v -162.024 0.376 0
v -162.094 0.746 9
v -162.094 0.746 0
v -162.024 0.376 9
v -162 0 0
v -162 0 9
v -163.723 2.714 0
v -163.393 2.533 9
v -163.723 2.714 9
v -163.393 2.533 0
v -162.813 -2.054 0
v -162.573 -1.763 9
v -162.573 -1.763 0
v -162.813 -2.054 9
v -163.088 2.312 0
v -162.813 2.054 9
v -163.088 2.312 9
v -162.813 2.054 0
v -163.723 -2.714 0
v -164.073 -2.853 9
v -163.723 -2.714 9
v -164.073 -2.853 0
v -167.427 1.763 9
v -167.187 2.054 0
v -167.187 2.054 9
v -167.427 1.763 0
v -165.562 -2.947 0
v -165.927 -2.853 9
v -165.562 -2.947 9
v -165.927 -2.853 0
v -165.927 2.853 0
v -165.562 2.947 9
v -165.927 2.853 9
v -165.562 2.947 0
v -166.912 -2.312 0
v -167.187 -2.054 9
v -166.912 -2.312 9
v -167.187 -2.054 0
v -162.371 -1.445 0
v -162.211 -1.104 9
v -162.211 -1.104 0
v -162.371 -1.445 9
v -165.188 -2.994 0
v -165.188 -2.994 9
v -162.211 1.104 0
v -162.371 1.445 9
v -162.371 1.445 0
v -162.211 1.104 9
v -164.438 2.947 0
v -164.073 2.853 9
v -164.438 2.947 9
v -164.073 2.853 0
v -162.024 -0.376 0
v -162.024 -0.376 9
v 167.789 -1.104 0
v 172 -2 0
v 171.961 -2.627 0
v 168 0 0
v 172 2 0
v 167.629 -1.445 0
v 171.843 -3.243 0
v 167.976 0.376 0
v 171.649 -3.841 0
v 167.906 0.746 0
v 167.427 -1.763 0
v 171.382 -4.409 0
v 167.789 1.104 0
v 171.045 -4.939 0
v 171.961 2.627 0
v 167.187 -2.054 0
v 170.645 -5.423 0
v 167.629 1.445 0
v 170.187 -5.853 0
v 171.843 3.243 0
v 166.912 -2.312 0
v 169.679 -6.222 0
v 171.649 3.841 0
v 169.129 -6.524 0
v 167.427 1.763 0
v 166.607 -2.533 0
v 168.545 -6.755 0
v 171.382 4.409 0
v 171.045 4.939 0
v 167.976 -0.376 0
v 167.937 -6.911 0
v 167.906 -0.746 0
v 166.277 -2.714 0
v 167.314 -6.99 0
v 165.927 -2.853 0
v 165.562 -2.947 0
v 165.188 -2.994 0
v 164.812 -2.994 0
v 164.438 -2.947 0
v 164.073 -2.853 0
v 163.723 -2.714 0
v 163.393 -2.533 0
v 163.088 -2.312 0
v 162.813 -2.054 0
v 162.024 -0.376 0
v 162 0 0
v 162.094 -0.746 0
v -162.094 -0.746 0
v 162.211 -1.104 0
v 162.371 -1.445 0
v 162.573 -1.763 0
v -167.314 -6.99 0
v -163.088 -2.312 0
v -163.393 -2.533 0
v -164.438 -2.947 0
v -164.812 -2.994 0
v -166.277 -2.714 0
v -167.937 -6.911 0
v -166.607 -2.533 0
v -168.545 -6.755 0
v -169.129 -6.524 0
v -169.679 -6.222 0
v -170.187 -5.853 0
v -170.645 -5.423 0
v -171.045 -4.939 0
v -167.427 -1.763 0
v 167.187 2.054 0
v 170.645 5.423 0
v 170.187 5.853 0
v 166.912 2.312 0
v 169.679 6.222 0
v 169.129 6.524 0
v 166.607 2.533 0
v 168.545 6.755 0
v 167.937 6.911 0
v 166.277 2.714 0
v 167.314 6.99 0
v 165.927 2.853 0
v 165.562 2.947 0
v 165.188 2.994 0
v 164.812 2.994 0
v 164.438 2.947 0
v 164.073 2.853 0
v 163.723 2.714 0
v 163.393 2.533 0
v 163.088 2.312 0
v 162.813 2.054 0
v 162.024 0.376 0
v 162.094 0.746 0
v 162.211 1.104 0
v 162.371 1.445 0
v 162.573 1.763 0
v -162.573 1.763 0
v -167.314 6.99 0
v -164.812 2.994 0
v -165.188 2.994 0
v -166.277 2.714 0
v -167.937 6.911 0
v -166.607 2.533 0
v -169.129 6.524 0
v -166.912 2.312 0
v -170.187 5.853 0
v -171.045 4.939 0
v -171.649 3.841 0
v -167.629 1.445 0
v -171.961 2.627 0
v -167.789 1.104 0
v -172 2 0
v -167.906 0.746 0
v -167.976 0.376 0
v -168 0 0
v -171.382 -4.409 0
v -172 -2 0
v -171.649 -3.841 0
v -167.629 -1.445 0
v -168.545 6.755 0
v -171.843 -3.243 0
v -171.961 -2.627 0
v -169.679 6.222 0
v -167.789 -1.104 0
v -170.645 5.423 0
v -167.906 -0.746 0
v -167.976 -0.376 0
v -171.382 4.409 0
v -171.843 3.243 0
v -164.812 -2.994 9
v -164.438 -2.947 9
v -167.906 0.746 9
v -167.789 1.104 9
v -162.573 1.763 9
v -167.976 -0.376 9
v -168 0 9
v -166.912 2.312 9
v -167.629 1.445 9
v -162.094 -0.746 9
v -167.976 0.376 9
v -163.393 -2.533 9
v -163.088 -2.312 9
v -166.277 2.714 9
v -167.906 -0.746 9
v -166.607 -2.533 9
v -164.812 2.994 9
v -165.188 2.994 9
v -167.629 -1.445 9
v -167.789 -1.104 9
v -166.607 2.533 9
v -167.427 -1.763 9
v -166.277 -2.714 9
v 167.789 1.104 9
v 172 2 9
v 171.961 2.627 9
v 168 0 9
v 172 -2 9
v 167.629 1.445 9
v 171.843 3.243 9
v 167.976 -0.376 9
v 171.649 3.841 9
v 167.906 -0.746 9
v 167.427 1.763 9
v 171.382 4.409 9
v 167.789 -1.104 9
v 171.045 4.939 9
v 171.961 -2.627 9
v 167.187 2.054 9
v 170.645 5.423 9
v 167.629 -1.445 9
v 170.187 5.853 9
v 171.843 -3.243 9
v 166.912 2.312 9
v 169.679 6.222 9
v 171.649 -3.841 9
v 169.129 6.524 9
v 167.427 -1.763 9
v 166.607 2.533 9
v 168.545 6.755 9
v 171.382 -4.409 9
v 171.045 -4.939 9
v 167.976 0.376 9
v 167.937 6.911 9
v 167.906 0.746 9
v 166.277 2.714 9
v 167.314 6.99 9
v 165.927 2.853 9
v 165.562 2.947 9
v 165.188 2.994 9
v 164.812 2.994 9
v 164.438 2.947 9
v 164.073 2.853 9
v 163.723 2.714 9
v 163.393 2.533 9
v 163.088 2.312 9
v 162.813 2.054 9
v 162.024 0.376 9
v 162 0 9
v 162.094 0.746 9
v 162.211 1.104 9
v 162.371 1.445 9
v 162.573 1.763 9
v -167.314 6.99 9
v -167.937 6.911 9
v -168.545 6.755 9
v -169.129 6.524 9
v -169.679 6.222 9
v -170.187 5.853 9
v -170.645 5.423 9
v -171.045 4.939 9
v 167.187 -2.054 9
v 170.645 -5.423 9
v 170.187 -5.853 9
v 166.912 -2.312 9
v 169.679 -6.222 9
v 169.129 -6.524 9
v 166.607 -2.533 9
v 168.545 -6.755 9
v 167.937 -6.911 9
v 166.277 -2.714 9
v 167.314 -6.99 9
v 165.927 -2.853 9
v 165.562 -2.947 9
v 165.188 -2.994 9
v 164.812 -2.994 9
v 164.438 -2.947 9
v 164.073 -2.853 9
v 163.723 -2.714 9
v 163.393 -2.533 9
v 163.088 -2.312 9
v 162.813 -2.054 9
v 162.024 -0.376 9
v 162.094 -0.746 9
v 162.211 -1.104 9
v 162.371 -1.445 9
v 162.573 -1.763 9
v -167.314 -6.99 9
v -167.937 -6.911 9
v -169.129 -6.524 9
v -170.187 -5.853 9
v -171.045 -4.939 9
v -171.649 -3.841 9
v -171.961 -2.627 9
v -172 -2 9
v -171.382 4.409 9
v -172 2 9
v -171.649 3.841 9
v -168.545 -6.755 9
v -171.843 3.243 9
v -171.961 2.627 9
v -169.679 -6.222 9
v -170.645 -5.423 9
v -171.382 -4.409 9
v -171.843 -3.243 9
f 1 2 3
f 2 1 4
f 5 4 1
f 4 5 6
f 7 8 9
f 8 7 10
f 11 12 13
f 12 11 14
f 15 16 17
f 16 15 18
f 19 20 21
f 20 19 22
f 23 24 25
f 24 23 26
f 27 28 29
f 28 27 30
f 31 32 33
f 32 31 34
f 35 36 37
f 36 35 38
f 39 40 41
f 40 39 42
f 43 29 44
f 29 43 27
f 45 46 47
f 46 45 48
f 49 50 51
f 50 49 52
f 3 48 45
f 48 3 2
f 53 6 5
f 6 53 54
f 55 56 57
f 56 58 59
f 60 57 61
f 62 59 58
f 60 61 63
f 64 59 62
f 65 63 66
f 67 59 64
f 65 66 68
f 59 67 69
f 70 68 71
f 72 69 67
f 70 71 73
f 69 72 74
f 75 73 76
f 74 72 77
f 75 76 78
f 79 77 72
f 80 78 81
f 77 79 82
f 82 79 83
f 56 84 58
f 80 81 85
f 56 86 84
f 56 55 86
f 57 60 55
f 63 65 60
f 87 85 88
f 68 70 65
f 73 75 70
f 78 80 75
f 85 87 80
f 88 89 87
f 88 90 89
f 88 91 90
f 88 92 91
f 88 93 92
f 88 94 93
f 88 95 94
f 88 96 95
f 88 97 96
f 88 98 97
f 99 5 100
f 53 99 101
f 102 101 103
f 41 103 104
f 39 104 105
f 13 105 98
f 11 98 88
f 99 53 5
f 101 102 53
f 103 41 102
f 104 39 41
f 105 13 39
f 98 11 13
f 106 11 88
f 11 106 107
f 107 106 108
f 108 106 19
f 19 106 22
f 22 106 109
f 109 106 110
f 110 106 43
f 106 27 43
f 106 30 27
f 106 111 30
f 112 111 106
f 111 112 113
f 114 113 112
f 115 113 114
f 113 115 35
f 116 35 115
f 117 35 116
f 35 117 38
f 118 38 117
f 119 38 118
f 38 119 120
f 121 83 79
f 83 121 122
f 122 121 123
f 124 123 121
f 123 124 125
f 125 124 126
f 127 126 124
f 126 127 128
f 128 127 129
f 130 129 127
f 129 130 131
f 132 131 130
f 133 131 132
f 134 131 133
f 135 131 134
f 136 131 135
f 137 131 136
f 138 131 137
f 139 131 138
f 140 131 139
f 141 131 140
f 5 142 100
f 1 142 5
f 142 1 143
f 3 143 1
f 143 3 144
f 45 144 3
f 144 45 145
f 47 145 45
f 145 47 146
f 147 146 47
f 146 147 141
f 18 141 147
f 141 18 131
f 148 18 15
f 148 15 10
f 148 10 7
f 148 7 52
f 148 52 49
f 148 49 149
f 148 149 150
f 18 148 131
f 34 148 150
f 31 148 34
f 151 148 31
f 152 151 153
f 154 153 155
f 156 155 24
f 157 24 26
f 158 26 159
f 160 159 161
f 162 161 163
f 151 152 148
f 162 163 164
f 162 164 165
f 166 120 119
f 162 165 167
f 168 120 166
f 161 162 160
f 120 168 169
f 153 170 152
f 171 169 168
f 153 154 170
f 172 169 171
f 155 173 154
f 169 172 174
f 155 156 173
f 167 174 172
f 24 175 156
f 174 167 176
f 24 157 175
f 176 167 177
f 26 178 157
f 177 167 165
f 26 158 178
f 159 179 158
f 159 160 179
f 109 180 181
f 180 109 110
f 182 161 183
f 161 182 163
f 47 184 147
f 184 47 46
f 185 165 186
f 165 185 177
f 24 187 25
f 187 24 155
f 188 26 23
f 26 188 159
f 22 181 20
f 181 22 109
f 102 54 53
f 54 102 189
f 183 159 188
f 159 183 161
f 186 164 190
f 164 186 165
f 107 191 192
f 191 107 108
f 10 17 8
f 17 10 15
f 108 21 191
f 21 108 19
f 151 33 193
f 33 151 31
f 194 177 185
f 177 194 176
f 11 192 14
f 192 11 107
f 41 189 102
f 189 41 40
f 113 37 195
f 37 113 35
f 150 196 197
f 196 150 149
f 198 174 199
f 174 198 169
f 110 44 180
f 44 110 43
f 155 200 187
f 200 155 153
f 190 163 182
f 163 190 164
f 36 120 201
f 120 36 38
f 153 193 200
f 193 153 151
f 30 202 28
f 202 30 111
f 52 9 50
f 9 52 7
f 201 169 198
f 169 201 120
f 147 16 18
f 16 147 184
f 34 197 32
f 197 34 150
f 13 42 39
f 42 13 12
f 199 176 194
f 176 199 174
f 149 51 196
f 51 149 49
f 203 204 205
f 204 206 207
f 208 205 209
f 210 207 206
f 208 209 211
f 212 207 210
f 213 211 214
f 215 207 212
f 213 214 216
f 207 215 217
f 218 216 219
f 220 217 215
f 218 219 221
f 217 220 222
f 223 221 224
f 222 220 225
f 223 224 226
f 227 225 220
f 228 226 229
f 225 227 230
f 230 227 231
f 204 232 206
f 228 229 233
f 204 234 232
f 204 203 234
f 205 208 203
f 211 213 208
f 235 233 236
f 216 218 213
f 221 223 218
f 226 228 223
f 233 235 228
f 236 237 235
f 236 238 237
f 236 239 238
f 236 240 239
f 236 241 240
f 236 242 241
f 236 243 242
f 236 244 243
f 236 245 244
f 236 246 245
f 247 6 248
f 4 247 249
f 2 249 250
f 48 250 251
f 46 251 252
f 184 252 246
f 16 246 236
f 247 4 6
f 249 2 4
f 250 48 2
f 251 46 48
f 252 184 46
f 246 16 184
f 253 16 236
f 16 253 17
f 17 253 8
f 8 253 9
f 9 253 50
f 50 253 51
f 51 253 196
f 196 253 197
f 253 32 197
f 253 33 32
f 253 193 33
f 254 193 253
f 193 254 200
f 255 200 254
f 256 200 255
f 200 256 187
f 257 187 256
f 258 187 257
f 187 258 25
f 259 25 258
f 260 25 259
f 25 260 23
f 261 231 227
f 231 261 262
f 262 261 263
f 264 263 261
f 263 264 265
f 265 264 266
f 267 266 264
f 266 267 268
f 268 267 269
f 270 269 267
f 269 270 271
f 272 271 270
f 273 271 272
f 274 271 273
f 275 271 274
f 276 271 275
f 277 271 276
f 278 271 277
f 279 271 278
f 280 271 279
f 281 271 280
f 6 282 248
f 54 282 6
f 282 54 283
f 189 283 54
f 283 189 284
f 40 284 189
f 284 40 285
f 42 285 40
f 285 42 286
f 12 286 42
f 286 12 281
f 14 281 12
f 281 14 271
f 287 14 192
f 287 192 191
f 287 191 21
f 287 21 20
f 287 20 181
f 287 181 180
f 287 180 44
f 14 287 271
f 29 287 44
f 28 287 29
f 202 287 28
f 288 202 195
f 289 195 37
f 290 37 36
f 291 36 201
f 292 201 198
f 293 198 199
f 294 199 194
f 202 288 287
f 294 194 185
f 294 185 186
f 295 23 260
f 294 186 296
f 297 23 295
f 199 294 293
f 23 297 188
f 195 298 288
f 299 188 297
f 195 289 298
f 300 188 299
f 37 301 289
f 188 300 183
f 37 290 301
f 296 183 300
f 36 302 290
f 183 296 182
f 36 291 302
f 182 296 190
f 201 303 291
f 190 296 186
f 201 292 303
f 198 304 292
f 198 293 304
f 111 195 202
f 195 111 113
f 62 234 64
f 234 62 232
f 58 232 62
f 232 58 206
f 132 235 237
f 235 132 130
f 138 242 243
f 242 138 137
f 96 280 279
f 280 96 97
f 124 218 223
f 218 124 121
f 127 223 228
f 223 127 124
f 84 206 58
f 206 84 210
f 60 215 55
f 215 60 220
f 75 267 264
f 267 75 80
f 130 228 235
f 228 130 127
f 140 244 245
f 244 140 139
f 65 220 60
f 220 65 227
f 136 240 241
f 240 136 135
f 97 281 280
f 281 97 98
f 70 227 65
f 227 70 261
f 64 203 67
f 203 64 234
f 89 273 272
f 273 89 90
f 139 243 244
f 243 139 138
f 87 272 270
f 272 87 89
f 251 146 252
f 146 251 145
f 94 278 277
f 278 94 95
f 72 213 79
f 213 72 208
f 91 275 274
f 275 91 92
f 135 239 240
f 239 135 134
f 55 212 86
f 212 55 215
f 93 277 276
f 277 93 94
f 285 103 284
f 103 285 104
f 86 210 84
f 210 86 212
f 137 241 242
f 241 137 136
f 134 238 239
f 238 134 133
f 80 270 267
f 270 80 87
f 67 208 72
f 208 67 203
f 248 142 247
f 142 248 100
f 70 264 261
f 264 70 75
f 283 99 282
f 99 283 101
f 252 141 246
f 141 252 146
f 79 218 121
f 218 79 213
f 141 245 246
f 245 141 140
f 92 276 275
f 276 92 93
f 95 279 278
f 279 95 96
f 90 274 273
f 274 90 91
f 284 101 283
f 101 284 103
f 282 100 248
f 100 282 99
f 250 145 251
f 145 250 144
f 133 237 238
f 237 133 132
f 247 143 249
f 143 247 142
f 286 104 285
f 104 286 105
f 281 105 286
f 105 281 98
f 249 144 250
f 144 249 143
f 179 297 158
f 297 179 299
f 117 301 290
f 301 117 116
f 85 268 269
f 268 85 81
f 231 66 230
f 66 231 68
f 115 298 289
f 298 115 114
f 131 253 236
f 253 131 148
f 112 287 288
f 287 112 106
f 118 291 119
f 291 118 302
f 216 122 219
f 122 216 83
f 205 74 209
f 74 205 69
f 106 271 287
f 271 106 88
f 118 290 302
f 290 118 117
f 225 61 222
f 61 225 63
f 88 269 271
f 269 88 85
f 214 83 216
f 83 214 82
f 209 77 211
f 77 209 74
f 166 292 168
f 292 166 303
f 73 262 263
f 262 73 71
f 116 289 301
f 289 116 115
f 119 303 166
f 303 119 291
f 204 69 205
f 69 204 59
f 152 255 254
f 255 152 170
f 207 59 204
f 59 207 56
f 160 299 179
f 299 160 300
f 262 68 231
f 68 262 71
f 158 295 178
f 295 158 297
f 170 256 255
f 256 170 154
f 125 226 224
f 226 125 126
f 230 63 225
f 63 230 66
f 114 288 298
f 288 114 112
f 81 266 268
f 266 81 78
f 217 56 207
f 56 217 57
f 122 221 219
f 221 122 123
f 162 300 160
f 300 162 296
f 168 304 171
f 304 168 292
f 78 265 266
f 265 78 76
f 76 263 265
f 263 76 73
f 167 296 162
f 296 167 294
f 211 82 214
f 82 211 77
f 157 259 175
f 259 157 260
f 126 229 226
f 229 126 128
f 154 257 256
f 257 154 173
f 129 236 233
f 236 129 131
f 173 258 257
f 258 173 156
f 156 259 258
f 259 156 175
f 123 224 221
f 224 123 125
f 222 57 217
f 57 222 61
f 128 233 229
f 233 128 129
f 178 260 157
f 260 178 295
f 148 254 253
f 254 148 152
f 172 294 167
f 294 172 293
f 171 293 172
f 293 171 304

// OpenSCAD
$fn = 50;


difference() {
	union() {
		hull() {
			translate(v = [-167.0000000000, 2.0000000000, 0]) {
				cylinder(h = 9, r = 5);
			}
			translate(v = [167.0000000000, 2.0000000000, 0]) {
				cylinder(h = 9, r = 5);
			}
			translate(v = [-167.0000000000, -2.0000000000, 0]) {
				cylinder(h = 9, r = 5);
			}
			translate(v = [167.0000000000, -2.0000000000, 0]) {
				cylinder(h = 9, r = 5);
			}
		}
	}
	union() {
		translate(v = [-165.0000000000, 0.0000000000, 0]) {
			cylinder(h = 9, r = 3.0000000000);
		}
		translate(v = [165.0000000000, 0.0000000000, 0]) {
			cylinder(h = 9, r = 3.0000000000);
		}
		translate(v = [-165.0000000000, 0.0000000000, 0]) {
			cylinder(h = 9, r = 1.5000000000);
		}
		translate(v = [165.0000000000, 0.0000000000, 0]) {
			cylinder(h = 9, r = 1.5000000000);
		}
		translate(v = [-165.0000000000, 0.0000000000, 0]) {
			cylinder(h = 9, r = 1.5000000000);
		}
		translate(v = [165.0000000000, 0.0000000000, 0]) {
			cylinder(h = 9, r = 1.5000000000);
		}
		translate(v = [-165.0000000000, 0.0000000000, 0]) {
			cylinder(h = 9, r = 1.5000000000);
		}
		translate(v = [165.0000000000, 0.0000000000, 0]) {
			cylinder(h = 9, r = 1.5000000000);
		}
	}
}
